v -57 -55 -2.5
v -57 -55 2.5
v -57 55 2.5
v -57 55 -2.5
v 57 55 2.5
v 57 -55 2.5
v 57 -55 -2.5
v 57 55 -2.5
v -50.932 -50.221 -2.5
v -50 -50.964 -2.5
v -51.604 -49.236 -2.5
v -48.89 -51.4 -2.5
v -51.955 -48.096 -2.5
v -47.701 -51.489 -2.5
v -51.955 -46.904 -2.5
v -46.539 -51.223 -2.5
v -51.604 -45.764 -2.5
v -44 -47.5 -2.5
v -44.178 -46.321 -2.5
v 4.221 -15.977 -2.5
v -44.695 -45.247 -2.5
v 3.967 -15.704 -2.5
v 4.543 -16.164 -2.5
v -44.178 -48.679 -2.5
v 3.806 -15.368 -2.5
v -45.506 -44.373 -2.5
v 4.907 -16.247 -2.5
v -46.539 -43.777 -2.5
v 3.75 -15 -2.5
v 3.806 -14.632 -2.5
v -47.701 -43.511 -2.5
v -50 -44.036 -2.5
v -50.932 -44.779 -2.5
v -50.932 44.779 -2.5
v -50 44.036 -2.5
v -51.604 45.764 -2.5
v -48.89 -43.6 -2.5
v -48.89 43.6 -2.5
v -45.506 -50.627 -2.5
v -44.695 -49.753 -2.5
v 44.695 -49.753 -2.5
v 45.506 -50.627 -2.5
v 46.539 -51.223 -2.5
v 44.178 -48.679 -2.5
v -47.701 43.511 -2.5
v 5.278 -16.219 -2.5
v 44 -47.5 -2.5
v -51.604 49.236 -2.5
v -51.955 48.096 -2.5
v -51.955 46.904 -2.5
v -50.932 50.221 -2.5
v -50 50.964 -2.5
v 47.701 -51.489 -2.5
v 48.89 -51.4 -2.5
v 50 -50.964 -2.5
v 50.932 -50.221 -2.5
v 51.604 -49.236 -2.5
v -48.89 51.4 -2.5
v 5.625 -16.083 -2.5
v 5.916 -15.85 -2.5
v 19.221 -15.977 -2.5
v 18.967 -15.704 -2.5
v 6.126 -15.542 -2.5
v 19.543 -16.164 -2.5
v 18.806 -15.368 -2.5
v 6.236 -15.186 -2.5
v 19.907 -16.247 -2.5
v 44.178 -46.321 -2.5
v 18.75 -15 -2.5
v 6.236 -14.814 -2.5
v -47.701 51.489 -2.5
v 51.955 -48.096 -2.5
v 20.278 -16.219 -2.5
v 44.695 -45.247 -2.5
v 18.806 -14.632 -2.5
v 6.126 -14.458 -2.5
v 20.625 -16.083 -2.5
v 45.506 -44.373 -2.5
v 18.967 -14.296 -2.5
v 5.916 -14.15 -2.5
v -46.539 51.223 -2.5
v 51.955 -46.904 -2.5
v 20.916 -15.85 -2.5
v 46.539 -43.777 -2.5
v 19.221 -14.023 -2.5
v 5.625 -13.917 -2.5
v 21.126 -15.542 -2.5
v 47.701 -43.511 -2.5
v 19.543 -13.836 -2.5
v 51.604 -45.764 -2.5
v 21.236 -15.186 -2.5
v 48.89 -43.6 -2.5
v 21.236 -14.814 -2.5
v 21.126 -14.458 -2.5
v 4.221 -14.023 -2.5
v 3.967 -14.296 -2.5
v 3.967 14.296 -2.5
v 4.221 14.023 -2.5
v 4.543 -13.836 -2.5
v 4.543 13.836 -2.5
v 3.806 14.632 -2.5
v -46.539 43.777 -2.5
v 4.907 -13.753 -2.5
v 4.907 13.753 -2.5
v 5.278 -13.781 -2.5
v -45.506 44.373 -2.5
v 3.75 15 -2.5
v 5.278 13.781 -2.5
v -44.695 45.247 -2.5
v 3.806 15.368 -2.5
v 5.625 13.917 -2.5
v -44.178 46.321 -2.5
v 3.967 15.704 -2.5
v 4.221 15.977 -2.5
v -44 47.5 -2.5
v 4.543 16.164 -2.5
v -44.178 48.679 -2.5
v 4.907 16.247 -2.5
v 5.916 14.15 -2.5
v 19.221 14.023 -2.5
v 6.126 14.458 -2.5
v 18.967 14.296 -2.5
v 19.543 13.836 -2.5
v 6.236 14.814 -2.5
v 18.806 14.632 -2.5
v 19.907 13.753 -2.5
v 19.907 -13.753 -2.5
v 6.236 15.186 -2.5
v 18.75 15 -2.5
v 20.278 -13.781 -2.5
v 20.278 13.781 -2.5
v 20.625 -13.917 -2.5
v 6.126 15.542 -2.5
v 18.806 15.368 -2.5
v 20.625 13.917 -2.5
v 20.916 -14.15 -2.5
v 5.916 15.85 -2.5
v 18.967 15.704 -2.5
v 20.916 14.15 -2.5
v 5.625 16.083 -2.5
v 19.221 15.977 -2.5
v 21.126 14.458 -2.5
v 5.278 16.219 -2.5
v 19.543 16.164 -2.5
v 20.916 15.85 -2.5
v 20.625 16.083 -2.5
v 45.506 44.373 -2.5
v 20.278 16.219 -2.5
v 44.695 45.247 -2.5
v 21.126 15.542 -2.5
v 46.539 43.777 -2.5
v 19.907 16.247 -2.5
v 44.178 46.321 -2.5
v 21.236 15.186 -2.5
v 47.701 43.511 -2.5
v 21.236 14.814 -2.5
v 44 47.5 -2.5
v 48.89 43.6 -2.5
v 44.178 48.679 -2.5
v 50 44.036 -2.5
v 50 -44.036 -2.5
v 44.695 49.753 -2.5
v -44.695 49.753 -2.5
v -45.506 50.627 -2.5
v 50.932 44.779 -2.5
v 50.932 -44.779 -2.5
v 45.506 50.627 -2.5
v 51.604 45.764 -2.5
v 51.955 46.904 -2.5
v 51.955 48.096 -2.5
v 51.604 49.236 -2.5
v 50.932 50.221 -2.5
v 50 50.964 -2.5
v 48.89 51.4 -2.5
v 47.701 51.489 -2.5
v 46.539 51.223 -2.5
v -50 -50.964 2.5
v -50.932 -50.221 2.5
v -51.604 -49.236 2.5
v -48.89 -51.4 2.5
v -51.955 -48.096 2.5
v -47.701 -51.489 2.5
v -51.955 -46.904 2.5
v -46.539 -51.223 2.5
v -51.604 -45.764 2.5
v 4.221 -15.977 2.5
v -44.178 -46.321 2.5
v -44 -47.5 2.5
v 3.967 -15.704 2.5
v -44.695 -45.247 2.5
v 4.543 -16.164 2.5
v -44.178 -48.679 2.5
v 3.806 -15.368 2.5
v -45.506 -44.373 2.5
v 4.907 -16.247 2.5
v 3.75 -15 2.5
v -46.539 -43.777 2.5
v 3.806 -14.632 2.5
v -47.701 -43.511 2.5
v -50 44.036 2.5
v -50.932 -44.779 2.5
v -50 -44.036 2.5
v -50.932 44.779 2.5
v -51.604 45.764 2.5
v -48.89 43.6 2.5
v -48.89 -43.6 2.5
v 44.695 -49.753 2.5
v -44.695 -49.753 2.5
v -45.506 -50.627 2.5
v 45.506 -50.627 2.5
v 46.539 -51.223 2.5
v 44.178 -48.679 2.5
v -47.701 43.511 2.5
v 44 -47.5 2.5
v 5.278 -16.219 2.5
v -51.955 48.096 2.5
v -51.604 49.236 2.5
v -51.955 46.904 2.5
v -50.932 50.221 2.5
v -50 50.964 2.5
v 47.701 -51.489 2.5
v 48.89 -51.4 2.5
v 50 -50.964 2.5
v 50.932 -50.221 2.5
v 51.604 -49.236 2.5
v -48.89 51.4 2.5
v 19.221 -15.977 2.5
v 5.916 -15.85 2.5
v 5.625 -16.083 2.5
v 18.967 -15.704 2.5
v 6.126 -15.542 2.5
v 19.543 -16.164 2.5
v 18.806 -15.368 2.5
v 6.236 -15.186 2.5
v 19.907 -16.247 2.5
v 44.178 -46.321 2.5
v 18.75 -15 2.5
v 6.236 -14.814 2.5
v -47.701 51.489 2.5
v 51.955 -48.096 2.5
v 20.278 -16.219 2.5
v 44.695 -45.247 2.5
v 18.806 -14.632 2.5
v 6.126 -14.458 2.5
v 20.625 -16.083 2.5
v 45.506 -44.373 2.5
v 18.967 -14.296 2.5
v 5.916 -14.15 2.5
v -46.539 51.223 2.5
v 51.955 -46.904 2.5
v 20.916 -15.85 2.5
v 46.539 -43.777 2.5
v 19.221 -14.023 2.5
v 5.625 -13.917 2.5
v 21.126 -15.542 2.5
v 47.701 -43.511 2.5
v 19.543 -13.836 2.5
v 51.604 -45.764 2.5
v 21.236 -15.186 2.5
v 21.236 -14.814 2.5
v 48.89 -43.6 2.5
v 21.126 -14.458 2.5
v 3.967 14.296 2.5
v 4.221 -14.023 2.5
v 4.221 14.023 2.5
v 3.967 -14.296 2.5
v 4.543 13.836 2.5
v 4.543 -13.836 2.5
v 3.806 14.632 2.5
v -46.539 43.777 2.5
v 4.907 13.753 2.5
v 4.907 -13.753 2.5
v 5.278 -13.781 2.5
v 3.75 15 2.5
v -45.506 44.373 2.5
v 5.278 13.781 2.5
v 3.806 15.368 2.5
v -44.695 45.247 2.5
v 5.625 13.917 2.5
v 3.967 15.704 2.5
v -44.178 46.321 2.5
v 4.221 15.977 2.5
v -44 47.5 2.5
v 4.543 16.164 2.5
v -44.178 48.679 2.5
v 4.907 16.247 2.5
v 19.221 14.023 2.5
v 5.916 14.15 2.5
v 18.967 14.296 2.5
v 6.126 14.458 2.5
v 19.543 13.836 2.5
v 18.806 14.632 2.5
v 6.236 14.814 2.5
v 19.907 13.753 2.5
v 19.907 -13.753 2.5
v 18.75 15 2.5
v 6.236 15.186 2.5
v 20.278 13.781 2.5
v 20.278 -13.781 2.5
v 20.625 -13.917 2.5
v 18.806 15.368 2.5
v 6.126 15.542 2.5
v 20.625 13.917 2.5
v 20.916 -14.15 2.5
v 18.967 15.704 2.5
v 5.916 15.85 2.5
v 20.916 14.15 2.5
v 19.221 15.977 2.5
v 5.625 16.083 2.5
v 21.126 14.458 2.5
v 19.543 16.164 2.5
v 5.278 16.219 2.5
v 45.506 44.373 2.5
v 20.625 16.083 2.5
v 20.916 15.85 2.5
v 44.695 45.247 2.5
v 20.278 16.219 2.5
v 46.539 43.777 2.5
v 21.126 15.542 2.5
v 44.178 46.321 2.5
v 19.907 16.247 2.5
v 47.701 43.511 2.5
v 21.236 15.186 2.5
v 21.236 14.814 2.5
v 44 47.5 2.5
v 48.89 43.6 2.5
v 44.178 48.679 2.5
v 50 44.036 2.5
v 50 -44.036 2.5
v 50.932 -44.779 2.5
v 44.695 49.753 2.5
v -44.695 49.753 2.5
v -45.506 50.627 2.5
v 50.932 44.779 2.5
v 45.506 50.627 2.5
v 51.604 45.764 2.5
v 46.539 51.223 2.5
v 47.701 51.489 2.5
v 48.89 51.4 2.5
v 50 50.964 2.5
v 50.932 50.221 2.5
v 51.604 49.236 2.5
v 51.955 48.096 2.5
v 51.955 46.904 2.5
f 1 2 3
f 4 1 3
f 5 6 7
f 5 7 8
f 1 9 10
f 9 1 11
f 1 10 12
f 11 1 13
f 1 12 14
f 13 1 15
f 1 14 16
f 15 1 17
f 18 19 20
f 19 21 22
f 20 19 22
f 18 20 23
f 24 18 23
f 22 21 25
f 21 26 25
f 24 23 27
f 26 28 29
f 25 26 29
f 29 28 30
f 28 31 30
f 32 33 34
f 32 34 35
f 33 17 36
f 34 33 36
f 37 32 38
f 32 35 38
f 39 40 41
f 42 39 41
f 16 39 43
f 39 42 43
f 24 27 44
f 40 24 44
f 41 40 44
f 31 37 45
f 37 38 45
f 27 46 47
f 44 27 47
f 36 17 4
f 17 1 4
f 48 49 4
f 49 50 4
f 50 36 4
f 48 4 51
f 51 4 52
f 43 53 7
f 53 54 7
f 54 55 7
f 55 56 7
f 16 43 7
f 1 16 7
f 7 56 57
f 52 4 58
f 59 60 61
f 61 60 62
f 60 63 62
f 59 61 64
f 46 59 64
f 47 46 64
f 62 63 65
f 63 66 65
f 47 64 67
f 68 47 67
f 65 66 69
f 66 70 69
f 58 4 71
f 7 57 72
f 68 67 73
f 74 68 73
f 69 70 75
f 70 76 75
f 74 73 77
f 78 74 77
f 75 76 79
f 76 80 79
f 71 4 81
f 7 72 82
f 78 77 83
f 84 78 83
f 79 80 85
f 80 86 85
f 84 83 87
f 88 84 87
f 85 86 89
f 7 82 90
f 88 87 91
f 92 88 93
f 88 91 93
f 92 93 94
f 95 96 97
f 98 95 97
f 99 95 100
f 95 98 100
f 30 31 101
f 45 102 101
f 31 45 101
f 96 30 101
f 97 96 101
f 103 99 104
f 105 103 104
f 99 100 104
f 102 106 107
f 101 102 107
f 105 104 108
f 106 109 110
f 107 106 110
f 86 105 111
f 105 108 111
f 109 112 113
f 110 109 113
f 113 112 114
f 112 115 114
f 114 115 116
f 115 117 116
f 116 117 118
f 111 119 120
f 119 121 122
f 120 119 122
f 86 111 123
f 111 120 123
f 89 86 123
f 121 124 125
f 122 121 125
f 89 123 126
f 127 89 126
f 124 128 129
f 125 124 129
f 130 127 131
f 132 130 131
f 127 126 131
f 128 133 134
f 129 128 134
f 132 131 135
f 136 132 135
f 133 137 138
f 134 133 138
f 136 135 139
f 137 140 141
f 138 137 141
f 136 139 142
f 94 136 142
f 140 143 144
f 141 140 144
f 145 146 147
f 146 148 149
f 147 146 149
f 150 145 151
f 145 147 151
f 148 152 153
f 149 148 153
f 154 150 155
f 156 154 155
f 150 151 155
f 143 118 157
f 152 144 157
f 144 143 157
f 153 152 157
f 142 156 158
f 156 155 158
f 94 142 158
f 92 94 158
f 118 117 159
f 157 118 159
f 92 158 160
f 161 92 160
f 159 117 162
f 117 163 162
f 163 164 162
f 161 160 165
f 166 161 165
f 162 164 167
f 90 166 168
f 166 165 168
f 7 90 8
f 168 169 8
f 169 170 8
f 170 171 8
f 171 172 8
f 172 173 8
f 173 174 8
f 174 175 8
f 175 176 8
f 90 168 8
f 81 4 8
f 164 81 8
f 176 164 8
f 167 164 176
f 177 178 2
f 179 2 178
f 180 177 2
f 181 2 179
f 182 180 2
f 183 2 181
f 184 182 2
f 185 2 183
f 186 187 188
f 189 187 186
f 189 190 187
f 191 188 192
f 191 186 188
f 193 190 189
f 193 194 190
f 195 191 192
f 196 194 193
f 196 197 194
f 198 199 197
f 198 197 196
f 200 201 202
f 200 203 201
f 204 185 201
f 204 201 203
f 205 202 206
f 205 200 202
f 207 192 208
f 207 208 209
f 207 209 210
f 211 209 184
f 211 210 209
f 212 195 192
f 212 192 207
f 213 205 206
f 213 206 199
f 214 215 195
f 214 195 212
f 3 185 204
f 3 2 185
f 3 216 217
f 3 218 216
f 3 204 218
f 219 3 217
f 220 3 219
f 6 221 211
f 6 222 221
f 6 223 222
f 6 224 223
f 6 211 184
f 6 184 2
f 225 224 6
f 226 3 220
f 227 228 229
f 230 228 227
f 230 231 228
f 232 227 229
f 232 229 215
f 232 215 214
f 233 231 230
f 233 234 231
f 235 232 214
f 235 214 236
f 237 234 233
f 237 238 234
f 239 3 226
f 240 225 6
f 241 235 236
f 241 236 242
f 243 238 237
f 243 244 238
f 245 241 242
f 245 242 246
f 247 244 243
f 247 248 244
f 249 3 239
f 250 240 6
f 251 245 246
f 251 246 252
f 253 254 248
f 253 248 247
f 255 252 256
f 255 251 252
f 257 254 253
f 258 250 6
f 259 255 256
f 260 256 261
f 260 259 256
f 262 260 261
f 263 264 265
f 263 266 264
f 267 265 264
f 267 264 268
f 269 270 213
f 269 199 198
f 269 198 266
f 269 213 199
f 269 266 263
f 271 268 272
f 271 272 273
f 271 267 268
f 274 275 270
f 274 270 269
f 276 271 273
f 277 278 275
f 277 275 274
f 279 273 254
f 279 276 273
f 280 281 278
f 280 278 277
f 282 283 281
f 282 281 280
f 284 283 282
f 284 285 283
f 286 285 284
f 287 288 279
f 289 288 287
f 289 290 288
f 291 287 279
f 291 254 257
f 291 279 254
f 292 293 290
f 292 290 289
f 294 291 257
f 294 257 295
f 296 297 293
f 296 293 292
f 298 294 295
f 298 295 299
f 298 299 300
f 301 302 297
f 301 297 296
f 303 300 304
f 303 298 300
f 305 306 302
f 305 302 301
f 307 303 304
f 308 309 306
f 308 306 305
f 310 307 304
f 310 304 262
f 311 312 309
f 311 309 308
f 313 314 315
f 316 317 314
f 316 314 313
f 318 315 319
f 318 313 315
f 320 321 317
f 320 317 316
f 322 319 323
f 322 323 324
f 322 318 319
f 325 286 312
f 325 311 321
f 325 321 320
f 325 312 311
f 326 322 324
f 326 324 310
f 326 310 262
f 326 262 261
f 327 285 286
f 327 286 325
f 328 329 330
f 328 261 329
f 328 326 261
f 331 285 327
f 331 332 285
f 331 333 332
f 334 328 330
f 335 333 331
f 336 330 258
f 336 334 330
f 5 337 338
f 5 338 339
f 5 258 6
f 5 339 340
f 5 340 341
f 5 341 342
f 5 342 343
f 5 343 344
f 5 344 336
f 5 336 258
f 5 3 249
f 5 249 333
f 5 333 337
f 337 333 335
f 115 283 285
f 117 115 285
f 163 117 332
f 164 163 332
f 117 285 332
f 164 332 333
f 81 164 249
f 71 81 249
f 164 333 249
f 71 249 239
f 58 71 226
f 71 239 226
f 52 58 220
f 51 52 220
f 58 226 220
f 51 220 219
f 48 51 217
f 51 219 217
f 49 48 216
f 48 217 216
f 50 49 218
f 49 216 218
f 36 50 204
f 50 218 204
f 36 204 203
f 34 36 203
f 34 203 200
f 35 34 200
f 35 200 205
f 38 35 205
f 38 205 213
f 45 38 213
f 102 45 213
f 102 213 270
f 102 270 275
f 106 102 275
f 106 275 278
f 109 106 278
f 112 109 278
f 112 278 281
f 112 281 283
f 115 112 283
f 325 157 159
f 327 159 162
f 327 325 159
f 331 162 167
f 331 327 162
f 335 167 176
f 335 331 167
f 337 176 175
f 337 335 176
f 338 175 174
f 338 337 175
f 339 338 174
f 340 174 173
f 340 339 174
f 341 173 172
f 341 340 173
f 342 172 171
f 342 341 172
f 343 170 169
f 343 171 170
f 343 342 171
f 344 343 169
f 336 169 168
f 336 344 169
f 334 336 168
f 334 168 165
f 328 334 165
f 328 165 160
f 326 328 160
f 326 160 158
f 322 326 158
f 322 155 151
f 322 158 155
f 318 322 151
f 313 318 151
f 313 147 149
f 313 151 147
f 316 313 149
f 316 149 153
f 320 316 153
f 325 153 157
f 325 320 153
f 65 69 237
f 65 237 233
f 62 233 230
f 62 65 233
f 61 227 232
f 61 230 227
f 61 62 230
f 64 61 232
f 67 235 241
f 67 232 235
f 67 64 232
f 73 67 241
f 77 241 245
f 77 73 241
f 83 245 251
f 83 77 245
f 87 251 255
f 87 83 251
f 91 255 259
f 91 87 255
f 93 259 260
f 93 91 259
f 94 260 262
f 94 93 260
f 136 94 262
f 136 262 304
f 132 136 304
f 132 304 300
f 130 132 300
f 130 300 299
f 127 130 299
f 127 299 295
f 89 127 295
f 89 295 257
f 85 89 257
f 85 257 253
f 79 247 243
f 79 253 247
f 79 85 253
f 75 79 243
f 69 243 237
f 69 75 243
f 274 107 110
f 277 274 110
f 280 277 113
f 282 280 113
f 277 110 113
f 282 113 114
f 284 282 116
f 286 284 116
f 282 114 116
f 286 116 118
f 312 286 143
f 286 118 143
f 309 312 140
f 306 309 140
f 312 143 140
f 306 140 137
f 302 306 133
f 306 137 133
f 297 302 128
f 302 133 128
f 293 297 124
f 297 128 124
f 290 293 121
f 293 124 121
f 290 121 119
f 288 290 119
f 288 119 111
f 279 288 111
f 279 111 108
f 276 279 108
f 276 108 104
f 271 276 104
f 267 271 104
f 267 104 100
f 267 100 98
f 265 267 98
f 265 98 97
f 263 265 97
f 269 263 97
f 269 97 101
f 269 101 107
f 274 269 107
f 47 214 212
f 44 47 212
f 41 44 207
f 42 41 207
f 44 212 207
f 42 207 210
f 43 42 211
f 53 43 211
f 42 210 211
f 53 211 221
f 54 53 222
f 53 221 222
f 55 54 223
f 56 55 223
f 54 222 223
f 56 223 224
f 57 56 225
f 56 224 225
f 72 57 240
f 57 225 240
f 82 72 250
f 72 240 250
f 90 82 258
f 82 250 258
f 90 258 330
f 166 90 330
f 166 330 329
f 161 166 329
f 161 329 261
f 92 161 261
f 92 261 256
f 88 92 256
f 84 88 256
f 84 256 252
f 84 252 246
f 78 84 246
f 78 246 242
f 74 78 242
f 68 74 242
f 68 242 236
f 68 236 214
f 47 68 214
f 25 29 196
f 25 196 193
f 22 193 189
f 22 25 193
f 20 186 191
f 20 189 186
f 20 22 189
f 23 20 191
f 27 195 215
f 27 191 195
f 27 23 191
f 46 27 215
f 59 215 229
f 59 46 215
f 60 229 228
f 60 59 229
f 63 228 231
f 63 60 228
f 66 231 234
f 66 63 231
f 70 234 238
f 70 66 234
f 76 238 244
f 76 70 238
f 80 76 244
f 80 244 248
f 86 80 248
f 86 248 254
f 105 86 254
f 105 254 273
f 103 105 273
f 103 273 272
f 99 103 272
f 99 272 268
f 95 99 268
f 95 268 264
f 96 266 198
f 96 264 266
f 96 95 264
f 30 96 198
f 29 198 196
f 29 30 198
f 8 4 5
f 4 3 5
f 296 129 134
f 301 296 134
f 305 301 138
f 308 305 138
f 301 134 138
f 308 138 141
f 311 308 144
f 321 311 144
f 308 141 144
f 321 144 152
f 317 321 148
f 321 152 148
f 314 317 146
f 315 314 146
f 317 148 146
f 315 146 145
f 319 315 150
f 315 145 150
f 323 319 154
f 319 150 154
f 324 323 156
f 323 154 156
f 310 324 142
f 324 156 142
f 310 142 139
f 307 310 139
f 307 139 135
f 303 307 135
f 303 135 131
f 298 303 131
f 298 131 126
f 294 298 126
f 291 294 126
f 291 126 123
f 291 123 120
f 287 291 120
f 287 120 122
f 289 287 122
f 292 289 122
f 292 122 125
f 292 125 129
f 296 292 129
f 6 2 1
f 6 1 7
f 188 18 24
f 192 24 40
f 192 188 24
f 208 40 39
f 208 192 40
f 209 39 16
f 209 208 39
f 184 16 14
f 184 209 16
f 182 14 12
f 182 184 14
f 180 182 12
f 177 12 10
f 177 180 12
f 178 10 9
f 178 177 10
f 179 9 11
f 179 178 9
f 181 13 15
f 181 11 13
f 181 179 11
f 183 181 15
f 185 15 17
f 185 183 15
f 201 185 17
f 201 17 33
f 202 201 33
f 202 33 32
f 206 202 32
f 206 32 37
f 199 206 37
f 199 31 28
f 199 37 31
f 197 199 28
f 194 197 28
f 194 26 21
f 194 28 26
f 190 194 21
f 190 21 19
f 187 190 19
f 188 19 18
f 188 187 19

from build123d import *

# Parameters (mm, degrees)
SKETCH_1_W               = 114
SKETCH_1_H               = 110
EXTRUDE_2_DEPTH          = 2.5
SKETCH_2_R               = 4
CUT_EXTRUDE_1_DEPTH      = 80.366239674
MIRROR_2_COPY_1_SKETCH_R = 4
MIRROR_2_COPY_1_DEPTH    = 80.366239674
HOLE_WIZARD_M3_1_D       = 2.5


with BuildPart() as part:
    # 草图1 → 凸台-拉伸2 (new, symmetric)
    with BuildSketch(Plane.XY):
        Rectangle(SKETCH_1_W, SKETCH_1_H)
    extrude(amount=EXTRUDE_2_DEPTH, both=True)

    # 草图2 → 切除-拉伸1 (cut, through all)
    with BuildSketch(Plane.XY.offset(2.5)):
        with Locations((-48, 47.5)):
            Circle(SKETCH_2_R)
    cut_extrude_1 = extrude(amount=-CUT_EXTRUDE_1_DEPTH, mode=Mode.SUBTRACT)

    # 镜向1: 切除-拉伸1 across plane
    add(cut_extrude_1.mirror(Plane.ZX), mode=Mode.SUBTRACT)

    # 镜向2: 切除-拉伸1 across plane
    add(cut_extrude_1.mirror(Plane(origin=(0, 0, 0), x_dir=(0, 0, 1), z_dir=(1, 0, 0))), mode=Mode.SUBTRACT)

    # 镜向2 copy 1 sketch → 镜向2 copy 1 (cut, through all)
    with BuildSketch(Plane(origin=(0, 0, 2.5), x_dir=(-1, 0, 0), z_dir=(0, 0, 1))):
        with Locations((-48, 47.5)):
            Circle(MIRROR_2_COPY_1_SKETCH_R)
    extrude(amount=-MIRROR_2_COPY_1_DEPTH, mode=Mode.SUBTRACT)

    # M3 螺纹孔的螺纹孔钻头1 (through all)
    with Locations(Plane(origin=(5, 15, 2.5), x_dir=(1, 0, 0), z_dir=(0, 0, 1))):
        with Locations((0, 0), (15, 0)):
            hole_wizard_m3_1 = Hole(HOLE_WIZARD_M3_1_D / 2)

    # 镜向3: M3 螺纹孔的螺纹孔钻头1 across plane
    add(hole_wizard_m3_1.mirror(Plane.ZX), mode=Mode.SUBTRACT)


solid = part.part
